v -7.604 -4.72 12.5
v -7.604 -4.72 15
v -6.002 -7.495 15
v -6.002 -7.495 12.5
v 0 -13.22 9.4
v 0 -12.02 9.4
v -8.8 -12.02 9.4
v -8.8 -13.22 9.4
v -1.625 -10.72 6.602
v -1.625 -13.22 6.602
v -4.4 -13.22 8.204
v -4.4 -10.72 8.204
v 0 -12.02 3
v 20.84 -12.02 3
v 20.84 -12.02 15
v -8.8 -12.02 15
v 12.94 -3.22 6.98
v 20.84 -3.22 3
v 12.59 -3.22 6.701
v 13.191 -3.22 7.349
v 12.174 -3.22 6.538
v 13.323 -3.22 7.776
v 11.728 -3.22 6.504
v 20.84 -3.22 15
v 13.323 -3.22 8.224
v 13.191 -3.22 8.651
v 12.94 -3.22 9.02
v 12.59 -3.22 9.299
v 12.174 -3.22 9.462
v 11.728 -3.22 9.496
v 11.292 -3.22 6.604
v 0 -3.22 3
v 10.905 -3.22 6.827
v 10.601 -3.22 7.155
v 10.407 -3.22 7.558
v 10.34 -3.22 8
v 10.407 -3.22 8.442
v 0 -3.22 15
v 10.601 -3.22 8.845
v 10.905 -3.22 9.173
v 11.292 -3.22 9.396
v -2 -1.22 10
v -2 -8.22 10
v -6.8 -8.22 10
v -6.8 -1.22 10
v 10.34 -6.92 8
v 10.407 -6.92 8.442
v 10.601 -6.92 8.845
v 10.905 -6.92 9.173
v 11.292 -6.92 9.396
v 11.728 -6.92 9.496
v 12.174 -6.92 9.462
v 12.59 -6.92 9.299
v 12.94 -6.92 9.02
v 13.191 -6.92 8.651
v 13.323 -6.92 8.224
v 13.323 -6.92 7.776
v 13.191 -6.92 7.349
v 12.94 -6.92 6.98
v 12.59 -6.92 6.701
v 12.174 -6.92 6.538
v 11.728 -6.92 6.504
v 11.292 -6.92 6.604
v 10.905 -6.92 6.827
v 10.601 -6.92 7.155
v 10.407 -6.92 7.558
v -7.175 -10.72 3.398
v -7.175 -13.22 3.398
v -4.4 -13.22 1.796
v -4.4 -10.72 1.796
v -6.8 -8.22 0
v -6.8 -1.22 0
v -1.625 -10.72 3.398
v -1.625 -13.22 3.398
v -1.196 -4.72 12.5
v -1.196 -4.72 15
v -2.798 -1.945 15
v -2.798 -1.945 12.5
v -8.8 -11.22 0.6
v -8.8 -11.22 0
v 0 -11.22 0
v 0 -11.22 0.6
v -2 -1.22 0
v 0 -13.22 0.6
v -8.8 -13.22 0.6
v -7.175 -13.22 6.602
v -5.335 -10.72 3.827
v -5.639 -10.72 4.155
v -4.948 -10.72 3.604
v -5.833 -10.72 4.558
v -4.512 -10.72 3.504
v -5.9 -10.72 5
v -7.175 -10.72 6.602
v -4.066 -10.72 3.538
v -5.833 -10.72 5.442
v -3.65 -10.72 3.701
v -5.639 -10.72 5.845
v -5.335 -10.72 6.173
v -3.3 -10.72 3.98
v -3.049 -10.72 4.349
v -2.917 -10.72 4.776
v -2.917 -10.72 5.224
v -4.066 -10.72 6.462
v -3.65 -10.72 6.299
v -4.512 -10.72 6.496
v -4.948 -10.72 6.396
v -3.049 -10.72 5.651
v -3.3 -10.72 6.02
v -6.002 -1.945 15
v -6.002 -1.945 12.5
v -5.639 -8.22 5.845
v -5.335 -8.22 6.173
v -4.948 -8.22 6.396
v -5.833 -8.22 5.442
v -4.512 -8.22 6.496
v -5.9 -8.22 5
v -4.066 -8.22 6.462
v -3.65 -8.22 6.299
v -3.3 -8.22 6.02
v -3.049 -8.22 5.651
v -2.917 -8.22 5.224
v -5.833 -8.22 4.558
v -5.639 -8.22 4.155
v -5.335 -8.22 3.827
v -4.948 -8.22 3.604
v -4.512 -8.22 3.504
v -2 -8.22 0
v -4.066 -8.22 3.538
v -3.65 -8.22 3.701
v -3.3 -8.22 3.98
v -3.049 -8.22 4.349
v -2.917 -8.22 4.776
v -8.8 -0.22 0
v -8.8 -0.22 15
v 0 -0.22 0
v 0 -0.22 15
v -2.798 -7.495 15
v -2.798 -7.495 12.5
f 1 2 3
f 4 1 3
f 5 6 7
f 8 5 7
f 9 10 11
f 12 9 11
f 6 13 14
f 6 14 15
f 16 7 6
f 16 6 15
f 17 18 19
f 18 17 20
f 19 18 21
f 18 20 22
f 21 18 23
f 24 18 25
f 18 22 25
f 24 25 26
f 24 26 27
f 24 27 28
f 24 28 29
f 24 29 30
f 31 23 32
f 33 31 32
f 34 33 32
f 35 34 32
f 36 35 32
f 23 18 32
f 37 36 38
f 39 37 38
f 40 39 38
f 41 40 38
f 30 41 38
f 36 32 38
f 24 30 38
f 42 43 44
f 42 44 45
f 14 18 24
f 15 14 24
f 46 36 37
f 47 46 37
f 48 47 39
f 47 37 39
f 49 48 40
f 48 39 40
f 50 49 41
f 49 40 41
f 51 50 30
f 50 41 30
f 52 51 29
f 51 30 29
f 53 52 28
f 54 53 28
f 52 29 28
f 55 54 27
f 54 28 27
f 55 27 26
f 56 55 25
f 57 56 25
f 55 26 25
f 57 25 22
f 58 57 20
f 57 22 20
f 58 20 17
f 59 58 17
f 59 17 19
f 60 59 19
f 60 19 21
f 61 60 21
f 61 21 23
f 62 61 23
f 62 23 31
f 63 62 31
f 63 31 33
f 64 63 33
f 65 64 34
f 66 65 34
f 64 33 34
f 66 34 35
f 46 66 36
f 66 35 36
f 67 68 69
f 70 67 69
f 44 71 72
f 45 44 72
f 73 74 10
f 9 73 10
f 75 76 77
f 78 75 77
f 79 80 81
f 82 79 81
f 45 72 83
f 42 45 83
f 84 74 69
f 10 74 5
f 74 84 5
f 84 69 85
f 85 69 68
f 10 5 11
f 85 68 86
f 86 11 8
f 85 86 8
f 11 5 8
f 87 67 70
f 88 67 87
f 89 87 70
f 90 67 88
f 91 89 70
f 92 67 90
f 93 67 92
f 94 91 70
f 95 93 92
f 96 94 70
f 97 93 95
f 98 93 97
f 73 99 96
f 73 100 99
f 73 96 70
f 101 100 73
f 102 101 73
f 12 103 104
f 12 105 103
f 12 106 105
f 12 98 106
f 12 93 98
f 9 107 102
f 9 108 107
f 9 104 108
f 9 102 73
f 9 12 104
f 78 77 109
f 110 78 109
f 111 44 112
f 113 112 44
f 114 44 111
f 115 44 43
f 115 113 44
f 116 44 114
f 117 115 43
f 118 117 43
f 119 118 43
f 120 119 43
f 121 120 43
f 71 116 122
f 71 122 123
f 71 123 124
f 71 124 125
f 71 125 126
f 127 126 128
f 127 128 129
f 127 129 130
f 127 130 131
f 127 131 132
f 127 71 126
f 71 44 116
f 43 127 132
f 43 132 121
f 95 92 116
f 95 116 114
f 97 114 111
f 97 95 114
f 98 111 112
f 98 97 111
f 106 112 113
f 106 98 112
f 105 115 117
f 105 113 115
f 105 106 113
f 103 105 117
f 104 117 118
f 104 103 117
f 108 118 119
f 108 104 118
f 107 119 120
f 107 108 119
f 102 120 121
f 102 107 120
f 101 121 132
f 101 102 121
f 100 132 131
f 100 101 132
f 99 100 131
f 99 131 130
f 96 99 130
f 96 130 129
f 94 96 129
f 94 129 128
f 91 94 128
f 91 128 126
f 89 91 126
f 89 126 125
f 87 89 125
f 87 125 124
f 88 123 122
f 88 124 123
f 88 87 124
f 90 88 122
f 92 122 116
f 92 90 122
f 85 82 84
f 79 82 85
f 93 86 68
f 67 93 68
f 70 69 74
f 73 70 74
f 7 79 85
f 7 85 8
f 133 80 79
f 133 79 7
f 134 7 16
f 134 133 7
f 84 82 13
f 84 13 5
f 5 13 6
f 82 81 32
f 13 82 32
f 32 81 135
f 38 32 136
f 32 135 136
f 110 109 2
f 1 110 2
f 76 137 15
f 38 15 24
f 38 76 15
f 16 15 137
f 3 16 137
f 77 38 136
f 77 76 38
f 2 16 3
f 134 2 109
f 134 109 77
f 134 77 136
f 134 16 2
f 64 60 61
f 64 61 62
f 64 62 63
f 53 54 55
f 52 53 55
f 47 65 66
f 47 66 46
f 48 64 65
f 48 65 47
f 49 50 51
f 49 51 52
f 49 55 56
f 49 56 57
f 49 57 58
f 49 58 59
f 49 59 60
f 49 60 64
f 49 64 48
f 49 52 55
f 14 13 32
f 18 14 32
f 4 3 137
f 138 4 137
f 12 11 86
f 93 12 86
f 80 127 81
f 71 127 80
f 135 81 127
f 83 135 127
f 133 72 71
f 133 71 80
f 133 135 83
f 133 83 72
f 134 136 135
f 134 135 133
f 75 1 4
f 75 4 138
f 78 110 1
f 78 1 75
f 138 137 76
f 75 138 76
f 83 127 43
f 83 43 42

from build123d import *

# Parameters (mm, degrees)
SKETCH_1_W          = 4.8
SKETCH_1_H          = 7
EXTRUDE_1_DEPTH     = 15
SKETCH_2_W          = 5
SKETCH_2_H          = 7
EXTRUDE_2_DEPTH     = 5
SKETCH_3_R          = 1.5
CUT_EXTRUDE_1_DEPTH = 15
SKETCH_5_W          = 12
SKETCH_5_H          = 8.8
EXTRUDE_4_DEPTH     = 29.64
CUT_EXTRUDE_2_DEPTH = 2.5
CUT_EXTRUDE_3_REACH = 13
SKETCH_8_R          = 1.5
SKETCH_9_W          = 8.8
SKETCH_9_H          = 8.8
EXTRUDE_5_DEPTH     = 2
CUT_EXTRUDE_5_DEPTH = 2.5
SKETCH_11_R         = 1.5
CUT_EXTRUDE_7_DEPTH = 3.7
SKETCH_12_W         = 4.8
SKETCH_12_H         = 7
CUT_EXTRUDE_8_DEPTH = 10


with BuildPart() as part:
    # 草图1 → 凸台-拉伸1 (new body)
    with BuildSketch(Plane.XY):
        Polygon((-6.8, -0.219543147), (0, -0.219543147), (0, -11.219543147), (-6.8, -11.219543147), (-8.8, -11.219543147), (-8.8, -0.219543147), align=None)
        with Locations((-4.4, -4.719543147)):
            Rectangle(SKETCH_1_W, SKETCH_1_H, mode=Mode.SUBTRACT)
    extrude(amount=EXTRUDE_1_DEPTH)

    # 草图2 → 凸台-拉伸2 (add)
    with BuildSketch(Plane.ZY.offset(2)):
        with Locations((12.5, -4.719543147)):
            Rectangle(SKETCH_2_W, SKETCH_2_H)
    extrude(amount=EXTRUDE_2_DEPTH)

    # 草图3 → 切除-拉伸1 (cut)
    with BuildSketch(Plane.XY.offset(15)):
        with Locations((-4.4, -4.719543147)):
            Circle(SKETCH_3_R)
    extrude(amount=-CUT_EXTRUDE_1_DEPTH, mode=Mode.SUBTRACT)

    # 草图5 → 凸台-拉伸4 (add)
    with BuildSketch(Plane.ZY.offset(8.8)):
        with Locations((9, -7.619543147)):
            Rectangle(SKETCH_5_W, SKETCH_5_H)
    extrude(amount=-EXTRUDE_4_DEPTH)

    # 草图7 → 切除-拉伸2 (cut)
    with BuildSketch(Plane.XY.offset(15)):
        Polygon((-1.195706006, -4.719543147), (-2.797853003, -1.944543147), (-6.002146997, -1.944543147), (-7.604293994, -4.719543147), (-6.002146997, -7.494543147), (-2.797853003, -7.494543147), align=None)
    extrude(amount=-CUT_EXTRUDE_2_DEPTH, mode=Mode.SUBTRACT)

    # 草图8 → 切除-拉伸3 (cut, up to next)
    with BuildSketch(Plane(origin=(0, -11.219543147, 0), x_dir=(-1, 0, 0), z_dir=(0, 1, 0)), mode=Mode.PRIVATE) as cut_extrude_3_sk1:
        with Locations((4.4, 5)):
            Circle(SKETCH_8_R)
    cut_extrude_3_tool1 = extrude(cut_extrude_3_sk1.sketch, amount=CUT_EXTRUDE_3_REACH, mode=Mode.PRIVATE) & part.part
    add(cut_extrude_3_tool1.solids().sort_by_distance((-4.4, -11.219543, 5))[0], mode=Mode.SUBTRACT)

    # 草图9 → 凸台-拉伸5 (add)
    with BuildSketch(Plane(origin=(0, -11.219543147, 0), x_dir=(-1, 0, 0), z_dir=(0, 1, 0))):
        with Locations((4.4, 5)):
            Rectangle(SKETCH_9_W, SKETCH_9_H)
    extrude(amount=-EXTRUDE_5_DEPTH)

    # 草图10 → 切除-拉伸5 (cut)
    with BuildSketch(Plane.XZ.offset(13.219543147)):
        Polygon((-4.4, 1.795706006), (-1.625, 3.397853003), (-1.625, 6.602146997), (-4.4, 8.204293994), (-7.175, 6.602146997), (-7.175, 3.397853003), align=None)
    extrude(amount=-CUT_EXTRUDE_5_DEPTH, mode=Mode.SUBTRACT)

    # 草图11 → 切除-拉伸7 (cut)
    with BuildSketch(Plane(origin=(0, -3.219543147, 0), x_dir=(-1, 0, 0), z_dir=(0, 1, 0))):
        with Locations((-11.84, 8)):
            Circle(SKETCH_11_R)
    extrude(amount=-CUT_EXTRUDE_7_DEPTH, mode=Mode.SUBTRACT)

    # 草图12 → 切除-拉伸8 (cut)
    with BuildSketch(Plane(origin=(0, 0, 0), x_dir=(-1, 0, 0), z_dir=(0, 0, -1))):
        with Locations((4.4, -4.719543147)):
            Rectangle(SKETCH_12_W, SKETCH_12_H)
    extrude(amount=-CUT_EXTRUDE_8_DEPTH, mode=Mode.SUBTRACT)


solid = part.part
